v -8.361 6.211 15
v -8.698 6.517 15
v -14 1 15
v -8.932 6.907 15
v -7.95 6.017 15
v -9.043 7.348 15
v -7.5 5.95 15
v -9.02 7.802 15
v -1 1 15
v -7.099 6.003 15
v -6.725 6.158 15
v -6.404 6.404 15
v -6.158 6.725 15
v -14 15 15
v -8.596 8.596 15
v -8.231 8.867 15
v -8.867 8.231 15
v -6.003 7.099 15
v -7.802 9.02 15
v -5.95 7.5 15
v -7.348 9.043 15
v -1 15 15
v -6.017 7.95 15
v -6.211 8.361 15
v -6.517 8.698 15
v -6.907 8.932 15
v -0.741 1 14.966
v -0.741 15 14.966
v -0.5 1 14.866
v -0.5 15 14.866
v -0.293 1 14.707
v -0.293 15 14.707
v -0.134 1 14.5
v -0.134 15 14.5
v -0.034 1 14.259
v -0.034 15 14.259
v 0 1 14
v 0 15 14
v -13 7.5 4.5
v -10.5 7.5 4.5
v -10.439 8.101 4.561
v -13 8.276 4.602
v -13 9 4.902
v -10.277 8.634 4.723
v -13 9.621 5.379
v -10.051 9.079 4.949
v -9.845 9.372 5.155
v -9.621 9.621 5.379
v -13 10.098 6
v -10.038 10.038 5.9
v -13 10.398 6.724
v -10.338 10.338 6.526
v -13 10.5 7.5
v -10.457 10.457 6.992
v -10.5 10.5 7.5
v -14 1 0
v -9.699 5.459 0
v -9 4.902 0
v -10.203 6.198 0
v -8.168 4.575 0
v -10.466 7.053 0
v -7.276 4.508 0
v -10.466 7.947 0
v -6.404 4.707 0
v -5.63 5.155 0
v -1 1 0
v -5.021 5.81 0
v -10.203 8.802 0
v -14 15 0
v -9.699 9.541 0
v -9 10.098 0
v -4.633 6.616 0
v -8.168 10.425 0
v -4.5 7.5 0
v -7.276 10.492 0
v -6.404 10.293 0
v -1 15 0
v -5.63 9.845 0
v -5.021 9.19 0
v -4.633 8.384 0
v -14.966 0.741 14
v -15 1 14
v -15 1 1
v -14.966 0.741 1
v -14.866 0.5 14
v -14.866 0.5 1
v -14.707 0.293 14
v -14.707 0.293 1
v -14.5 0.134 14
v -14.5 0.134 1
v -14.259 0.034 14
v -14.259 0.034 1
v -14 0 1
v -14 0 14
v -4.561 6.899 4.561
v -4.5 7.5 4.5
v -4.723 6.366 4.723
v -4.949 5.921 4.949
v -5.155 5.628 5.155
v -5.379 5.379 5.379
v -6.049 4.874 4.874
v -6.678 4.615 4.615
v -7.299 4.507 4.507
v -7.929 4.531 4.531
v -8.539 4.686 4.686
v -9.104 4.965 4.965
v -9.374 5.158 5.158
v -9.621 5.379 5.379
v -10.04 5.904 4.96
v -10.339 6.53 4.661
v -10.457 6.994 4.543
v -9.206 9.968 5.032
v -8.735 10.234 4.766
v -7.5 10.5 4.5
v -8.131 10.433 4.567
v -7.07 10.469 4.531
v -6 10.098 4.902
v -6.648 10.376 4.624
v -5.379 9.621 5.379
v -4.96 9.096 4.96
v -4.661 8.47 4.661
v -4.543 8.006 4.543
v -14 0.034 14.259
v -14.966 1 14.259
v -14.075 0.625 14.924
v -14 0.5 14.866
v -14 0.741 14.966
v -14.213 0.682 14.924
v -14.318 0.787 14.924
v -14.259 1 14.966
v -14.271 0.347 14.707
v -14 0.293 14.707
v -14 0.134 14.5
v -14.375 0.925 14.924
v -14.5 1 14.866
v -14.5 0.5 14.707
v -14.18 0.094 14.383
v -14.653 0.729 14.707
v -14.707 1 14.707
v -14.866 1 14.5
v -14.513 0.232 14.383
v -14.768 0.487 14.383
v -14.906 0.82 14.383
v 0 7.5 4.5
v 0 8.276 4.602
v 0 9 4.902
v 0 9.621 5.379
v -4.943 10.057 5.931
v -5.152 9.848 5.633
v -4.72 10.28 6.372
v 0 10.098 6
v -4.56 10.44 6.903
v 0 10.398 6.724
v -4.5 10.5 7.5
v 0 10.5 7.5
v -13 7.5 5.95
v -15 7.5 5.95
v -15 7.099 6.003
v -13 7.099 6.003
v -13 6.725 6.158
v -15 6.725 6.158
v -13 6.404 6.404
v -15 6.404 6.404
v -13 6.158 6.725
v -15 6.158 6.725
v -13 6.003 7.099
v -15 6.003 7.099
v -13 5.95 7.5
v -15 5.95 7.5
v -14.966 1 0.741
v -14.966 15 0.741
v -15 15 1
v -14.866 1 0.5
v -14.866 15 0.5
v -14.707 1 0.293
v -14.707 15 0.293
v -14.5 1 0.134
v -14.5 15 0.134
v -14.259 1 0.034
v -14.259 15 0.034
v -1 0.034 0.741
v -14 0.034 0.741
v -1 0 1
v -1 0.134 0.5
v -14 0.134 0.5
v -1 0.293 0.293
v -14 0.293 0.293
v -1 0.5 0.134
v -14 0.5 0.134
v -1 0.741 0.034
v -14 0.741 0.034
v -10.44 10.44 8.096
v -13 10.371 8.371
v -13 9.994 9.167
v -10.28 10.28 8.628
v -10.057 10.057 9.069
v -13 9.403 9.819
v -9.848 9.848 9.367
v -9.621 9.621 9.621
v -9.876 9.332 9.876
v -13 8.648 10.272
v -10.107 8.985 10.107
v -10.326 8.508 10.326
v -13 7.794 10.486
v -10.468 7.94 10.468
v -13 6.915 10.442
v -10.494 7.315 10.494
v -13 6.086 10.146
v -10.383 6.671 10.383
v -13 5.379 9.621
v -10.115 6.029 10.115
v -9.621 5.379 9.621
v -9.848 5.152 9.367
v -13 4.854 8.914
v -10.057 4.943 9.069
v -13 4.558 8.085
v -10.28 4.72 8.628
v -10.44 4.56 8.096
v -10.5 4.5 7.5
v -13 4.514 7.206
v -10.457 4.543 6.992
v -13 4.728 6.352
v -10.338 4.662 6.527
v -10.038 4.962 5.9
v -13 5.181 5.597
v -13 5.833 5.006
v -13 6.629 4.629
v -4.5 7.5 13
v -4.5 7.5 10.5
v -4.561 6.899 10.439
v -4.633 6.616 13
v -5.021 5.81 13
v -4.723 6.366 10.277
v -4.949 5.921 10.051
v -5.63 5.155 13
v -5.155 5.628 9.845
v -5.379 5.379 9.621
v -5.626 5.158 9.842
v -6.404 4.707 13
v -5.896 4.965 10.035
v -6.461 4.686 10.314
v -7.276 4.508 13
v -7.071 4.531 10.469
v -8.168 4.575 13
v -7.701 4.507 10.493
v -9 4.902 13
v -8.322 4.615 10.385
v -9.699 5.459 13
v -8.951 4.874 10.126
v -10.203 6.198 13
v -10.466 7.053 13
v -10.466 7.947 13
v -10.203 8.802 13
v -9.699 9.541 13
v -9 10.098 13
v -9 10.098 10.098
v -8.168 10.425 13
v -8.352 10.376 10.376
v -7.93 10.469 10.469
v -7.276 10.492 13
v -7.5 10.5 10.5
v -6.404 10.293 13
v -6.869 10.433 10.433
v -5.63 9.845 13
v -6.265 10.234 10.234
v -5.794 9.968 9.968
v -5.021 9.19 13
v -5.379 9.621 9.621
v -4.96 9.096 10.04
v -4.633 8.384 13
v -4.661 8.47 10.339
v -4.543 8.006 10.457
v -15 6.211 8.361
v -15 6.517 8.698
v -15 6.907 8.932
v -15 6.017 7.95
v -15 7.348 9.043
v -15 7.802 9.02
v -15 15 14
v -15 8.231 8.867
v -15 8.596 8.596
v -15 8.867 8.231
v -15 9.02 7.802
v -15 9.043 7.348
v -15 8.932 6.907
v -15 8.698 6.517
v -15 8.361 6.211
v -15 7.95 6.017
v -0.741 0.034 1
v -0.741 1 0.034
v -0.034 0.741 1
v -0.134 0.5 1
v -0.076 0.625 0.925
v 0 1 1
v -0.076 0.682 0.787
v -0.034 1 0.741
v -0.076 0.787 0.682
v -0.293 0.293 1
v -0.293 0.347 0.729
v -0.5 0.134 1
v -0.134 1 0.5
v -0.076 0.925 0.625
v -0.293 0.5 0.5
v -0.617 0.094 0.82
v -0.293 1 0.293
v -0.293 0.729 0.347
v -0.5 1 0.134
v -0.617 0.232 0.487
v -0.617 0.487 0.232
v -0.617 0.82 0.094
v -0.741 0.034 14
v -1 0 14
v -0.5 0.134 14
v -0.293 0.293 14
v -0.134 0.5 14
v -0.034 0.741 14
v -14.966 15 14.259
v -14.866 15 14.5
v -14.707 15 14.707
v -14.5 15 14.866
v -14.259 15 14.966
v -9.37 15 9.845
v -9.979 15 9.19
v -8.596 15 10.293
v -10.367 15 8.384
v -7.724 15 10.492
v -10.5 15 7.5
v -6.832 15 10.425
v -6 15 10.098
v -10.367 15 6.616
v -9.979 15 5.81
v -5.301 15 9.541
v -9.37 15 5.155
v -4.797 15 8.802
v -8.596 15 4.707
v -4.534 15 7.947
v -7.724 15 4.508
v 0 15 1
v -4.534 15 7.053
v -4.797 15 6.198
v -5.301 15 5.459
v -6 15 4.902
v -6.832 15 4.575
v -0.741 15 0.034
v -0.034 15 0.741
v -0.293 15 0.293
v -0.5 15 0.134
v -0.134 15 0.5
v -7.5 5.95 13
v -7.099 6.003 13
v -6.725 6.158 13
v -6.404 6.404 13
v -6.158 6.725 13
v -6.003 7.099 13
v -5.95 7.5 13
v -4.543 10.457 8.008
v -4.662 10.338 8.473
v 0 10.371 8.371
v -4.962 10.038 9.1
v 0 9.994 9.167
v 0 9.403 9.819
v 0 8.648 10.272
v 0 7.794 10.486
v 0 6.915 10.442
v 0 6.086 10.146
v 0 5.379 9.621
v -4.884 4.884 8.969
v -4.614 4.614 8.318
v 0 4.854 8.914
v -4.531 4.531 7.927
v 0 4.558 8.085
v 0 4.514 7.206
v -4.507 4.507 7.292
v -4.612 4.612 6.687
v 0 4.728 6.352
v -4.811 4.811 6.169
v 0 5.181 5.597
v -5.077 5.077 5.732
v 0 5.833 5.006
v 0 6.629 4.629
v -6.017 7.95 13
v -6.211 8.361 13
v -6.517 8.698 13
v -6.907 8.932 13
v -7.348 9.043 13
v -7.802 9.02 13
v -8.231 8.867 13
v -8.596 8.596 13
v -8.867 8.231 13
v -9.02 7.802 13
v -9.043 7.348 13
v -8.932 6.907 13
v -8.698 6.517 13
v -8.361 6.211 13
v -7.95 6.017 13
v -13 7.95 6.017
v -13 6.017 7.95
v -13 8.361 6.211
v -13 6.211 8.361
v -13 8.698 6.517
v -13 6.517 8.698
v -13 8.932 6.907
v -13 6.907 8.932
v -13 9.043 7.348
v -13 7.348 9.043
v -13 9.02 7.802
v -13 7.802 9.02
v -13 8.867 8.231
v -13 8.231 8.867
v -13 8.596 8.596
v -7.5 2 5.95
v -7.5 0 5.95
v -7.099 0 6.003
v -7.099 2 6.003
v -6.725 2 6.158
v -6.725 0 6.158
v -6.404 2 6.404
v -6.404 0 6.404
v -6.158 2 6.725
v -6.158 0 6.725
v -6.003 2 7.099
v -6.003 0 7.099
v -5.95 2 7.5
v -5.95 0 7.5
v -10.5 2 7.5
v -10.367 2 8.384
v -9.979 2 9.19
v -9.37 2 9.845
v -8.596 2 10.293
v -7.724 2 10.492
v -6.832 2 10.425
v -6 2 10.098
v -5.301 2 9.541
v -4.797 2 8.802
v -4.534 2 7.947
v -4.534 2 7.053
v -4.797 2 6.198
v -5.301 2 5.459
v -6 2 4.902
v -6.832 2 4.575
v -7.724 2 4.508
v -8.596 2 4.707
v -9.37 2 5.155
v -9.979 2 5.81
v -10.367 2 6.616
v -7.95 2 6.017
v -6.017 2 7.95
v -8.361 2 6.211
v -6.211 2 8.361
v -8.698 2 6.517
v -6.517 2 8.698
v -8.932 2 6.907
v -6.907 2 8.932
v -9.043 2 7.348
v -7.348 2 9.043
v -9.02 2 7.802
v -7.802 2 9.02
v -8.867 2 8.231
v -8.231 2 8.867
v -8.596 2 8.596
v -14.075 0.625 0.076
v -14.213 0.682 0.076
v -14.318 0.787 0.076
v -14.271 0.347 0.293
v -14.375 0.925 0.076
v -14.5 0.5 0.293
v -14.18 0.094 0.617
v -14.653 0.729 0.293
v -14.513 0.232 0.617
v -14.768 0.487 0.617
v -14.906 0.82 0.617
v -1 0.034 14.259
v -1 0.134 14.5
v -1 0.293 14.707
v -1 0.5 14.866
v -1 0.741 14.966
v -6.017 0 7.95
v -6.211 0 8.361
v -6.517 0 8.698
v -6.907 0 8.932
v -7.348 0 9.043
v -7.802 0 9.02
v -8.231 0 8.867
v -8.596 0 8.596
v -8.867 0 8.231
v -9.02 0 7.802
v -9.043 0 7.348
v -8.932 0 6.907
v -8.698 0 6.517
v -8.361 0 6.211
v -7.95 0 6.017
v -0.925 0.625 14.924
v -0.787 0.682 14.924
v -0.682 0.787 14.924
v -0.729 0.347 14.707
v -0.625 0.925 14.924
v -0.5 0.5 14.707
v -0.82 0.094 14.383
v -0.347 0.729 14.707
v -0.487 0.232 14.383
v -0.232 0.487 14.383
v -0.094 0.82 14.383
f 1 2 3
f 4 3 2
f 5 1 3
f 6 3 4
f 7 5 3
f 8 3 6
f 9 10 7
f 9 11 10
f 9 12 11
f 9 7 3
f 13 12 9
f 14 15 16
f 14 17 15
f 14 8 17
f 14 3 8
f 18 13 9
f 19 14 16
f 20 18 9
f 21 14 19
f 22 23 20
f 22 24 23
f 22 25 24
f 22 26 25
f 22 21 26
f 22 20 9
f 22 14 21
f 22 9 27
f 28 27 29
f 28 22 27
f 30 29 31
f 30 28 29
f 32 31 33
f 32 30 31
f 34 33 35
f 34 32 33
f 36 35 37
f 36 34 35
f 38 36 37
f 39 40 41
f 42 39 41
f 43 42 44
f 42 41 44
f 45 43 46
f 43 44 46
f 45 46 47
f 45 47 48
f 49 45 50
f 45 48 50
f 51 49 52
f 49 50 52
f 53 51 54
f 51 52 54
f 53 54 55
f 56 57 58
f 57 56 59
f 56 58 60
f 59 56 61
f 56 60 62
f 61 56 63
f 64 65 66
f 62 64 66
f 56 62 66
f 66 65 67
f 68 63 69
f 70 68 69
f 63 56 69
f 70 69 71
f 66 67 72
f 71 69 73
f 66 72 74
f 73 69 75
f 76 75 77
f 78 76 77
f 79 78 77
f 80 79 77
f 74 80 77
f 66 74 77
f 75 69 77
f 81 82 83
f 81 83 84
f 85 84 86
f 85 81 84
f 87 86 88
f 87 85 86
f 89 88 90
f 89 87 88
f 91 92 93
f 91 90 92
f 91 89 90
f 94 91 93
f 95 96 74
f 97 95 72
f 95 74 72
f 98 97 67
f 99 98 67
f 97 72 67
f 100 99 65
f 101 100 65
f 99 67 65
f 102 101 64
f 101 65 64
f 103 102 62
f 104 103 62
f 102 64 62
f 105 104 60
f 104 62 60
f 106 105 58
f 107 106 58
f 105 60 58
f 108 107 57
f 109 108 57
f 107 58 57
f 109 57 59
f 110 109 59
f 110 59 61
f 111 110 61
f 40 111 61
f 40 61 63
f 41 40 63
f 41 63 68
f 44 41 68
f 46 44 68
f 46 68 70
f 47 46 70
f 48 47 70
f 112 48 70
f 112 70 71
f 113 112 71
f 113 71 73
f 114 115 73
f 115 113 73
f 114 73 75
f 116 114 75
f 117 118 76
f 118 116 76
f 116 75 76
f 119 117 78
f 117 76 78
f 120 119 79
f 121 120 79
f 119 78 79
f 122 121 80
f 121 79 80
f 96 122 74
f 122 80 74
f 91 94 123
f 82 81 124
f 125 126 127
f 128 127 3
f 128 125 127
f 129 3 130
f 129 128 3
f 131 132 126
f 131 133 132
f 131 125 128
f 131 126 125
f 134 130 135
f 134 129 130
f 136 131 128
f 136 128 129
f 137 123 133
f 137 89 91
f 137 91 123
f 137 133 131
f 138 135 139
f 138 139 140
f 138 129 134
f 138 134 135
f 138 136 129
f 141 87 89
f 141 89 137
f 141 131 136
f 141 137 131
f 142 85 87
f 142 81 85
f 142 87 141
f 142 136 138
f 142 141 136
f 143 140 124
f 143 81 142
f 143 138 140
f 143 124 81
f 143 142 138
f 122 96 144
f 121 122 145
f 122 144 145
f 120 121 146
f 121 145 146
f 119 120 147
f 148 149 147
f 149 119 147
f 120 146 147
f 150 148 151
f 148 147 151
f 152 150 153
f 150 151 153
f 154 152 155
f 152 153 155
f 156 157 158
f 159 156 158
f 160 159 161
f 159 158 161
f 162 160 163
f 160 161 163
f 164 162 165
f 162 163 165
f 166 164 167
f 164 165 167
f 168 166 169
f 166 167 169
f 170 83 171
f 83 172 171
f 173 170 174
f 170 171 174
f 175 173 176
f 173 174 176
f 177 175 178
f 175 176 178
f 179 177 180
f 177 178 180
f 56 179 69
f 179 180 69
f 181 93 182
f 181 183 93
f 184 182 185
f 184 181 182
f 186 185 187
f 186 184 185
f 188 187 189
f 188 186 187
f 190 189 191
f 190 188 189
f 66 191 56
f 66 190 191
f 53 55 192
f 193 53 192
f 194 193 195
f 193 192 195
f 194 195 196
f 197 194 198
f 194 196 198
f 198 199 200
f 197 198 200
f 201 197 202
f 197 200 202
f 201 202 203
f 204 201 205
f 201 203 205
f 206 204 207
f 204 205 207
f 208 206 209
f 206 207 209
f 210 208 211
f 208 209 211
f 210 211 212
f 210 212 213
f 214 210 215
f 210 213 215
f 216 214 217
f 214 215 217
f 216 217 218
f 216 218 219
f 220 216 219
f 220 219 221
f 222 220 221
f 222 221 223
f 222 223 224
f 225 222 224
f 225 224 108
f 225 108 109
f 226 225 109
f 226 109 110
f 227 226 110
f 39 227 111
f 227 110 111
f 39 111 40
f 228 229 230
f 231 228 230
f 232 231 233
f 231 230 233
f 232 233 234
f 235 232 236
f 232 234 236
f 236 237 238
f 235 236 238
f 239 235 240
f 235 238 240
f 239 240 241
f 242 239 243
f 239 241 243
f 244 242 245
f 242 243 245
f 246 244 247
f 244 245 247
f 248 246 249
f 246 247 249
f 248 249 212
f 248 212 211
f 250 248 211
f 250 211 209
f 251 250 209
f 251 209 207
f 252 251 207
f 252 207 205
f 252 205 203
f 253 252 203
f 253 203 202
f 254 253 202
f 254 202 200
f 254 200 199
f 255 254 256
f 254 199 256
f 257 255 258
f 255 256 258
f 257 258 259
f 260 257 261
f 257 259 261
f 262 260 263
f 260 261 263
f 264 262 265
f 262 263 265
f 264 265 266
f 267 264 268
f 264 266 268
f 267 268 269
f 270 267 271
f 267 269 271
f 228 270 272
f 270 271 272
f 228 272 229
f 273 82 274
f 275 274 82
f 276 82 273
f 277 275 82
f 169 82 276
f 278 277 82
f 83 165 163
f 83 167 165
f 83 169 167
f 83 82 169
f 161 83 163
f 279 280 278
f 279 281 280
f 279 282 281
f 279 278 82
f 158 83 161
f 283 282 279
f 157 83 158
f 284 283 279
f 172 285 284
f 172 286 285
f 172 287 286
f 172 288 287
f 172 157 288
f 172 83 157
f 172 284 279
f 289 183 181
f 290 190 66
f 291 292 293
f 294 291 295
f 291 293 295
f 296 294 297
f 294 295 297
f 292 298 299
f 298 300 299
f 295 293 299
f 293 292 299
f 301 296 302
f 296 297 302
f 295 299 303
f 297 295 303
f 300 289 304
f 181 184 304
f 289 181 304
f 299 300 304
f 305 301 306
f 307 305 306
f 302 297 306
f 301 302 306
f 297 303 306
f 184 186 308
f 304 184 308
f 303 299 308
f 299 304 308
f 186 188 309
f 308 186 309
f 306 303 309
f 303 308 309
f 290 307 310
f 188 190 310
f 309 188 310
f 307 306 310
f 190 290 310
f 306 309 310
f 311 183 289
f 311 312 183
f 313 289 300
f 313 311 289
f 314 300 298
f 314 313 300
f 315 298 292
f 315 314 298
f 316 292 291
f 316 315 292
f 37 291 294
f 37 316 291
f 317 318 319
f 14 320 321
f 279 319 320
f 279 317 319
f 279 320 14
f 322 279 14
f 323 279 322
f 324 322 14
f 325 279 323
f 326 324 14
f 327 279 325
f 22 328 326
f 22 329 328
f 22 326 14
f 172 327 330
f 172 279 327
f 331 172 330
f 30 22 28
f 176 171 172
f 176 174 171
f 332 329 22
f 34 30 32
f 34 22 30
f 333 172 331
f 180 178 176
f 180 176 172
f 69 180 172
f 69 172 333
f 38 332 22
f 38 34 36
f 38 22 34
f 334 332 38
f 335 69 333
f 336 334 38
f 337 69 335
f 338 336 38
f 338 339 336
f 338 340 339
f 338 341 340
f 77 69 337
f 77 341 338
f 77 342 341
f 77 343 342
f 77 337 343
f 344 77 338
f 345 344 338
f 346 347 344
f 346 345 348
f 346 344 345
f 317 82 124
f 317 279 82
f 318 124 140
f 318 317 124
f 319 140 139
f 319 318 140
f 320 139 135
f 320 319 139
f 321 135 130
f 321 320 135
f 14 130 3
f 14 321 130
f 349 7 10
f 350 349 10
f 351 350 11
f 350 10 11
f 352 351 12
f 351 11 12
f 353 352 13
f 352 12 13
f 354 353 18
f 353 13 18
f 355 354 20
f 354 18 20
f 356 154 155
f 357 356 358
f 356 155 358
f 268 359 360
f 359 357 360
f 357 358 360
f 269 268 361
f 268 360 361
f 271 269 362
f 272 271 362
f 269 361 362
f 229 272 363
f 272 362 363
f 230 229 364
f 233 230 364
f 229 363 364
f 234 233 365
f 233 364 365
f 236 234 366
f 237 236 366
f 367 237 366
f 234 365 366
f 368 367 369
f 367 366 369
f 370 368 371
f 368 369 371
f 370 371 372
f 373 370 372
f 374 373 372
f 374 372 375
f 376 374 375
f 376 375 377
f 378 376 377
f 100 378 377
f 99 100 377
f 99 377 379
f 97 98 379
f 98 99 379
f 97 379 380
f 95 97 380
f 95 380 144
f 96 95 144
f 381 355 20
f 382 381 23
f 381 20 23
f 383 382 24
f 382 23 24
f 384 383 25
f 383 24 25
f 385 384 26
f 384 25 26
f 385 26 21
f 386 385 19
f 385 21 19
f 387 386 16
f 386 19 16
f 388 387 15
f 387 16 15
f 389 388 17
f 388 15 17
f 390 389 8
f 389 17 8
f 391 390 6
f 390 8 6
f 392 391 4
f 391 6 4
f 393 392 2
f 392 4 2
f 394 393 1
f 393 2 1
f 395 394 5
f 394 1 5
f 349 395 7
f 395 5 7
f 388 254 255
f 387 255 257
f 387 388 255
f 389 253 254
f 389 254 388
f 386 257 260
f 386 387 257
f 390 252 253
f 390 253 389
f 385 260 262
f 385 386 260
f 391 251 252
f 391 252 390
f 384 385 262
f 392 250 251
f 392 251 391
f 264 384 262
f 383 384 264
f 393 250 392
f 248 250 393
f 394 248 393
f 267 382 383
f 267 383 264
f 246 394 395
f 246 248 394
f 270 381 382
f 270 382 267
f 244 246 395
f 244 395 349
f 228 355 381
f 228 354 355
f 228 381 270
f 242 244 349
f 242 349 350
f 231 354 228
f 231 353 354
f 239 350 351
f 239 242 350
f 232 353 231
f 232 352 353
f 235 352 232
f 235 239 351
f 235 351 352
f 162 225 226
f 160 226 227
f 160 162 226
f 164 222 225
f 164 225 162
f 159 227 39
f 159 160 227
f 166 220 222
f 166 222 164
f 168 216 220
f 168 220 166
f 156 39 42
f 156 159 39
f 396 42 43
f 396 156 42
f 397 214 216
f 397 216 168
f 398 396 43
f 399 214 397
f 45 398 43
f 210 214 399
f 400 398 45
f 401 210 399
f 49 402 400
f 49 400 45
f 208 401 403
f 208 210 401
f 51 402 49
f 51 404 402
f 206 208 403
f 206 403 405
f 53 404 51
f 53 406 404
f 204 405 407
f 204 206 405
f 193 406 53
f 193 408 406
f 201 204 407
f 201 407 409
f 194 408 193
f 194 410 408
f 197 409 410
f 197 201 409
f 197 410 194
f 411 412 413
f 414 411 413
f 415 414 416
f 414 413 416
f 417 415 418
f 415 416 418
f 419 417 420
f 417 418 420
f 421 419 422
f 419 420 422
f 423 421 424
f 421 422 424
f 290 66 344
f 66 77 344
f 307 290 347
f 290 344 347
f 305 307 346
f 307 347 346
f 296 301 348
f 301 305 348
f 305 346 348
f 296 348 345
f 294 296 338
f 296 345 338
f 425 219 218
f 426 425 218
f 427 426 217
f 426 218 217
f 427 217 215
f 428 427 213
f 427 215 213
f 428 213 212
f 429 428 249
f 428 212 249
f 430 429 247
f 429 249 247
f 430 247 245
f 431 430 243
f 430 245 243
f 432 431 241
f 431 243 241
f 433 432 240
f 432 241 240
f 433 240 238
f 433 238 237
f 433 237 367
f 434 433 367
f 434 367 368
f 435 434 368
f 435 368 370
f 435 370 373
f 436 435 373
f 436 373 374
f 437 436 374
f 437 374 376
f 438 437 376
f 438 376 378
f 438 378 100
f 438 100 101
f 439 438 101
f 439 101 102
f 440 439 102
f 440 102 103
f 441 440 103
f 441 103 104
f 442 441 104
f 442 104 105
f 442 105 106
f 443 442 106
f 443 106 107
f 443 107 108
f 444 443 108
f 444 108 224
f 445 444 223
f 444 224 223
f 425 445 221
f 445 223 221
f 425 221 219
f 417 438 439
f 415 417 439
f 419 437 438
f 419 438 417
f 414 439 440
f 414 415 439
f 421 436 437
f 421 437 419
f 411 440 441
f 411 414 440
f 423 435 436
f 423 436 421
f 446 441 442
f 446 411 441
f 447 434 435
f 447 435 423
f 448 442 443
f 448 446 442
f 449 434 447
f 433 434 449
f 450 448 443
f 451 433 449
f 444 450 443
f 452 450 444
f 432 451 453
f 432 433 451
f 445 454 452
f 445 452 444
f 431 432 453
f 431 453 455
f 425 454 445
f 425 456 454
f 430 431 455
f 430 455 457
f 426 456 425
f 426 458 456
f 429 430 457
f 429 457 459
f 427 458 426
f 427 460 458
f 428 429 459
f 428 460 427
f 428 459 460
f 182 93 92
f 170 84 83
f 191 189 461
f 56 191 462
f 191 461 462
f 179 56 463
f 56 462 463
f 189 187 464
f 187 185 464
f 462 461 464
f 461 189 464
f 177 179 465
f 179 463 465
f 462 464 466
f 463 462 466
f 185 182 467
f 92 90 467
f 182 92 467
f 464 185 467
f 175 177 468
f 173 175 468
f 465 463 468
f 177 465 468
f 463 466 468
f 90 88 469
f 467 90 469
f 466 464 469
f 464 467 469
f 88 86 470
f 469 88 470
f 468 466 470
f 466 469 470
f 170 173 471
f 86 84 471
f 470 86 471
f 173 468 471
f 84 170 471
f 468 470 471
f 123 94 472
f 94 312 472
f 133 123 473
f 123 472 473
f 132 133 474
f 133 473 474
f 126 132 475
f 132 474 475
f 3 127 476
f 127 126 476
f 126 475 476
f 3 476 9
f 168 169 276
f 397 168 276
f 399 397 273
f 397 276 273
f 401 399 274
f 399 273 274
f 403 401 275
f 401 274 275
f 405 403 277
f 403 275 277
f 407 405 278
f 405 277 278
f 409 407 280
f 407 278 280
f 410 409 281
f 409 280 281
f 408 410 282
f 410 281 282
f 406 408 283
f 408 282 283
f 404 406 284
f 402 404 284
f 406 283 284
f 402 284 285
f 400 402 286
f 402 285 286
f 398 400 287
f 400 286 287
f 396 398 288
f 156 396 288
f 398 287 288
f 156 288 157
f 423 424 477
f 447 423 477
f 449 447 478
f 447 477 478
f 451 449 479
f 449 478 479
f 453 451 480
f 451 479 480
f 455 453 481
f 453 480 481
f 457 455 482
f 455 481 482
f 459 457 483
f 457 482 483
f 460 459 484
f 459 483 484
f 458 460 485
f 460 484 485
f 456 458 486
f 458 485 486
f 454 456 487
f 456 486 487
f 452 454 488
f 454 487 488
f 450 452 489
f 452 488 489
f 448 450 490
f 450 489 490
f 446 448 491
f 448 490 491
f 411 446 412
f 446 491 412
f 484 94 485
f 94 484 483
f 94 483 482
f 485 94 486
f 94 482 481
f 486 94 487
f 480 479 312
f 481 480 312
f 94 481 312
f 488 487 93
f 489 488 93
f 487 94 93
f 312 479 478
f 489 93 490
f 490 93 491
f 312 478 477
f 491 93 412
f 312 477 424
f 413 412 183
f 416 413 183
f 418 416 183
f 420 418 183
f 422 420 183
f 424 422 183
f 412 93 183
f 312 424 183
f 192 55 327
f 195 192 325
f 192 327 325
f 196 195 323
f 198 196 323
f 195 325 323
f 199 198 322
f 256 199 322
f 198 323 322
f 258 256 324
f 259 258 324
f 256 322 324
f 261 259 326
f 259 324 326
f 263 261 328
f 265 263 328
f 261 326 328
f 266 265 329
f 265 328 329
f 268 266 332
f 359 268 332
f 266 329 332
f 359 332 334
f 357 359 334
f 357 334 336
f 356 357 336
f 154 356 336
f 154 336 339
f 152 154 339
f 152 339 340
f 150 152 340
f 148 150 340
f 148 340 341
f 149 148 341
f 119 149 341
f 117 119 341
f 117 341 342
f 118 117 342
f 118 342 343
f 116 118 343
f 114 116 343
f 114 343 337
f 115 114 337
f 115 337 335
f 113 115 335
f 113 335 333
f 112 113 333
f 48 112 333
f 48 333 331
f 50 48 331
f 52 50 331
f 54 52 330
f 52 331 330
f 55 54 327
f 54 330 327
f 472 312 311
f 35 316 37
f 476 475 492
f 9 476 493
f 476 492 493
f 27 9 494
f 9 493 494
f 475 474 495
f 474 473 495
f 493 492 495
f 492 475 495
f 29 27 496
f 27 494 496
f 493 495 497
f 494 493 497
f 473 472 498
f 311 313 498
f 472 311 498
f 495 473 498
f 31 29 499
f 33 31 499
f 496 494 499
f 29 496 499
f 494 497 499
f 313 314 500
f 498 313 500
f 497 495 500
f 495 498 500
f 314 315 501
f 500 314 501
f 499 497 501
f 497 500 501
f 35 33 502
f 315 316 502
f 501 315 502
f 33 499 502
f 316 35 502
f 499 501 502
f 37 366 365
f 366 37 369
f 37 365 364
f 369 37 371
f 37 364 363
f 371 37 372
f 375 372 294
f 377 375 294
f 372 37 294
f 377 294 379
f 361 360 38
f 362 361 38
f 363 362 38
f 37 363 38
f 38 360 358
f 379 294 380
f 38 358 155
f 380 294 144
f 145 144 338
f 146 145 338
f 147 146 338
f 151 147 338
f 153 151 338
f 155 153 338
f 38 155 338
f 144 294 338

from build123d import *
from build123d import SkipClean  # not in build123d's __all__

# Parameters (mm, degrees)
F0_W      = 15
F0_H      = 15
F1_DEPTH  = 15
F3_DEPTH  = 25
F5_DEPTH  = 25
F7_DEPTH  = 13
F9_DEPTH  = 25
F10_R     = 3
F11_DEPTH = 13
F12_R     = 3
F13_DEPTH = 13
F14_R     = 1


with BuildPart() as f1:
    # F0 (on Top) → F1 (new body)
    with BuildSketch(Plane.XY):
        with Locations((-7.5, 7.5)):
            Rectangle(F0_W, F0_H)
    extrude(amount=F1_DEPTH)

    # F2 (on face) → F3 (cut)
    with BuildSketch(Plane.XZ):
        with BuildLine():
            ThreePointArc((-7.5, 5.95), (-6.4039844892, 6.4039844892), (-5.95, 7.5))
            ThreePointArc((-5.95, 7.5), (-8.5960155108, 8.5960155108), (-7.5, 5.95))
        make_face()
    extrude(amount=-F3_DEPTH, mode=Mode.SUBTRACT)

    # F4 (on face) → F5 (cut)
    with BuildSketch(Plane.XY.offset(15)):
        with BuildLine():
            ThreePointArc((-7.5, 5.95), (-6.4039844892, 6.4039844892), (-5.95, 7.5))
            ThreePointArc((-5.95, 7.5), (-8.5960155108, 8.5960155108), (-7.5, 5.95))
        make_face()
    extrude(amount=-F5_DEPTH, mode=Mode.SUBTRACT)

    # F6 (on face) → F7 (cut)
    with BuildSketch(Plane.YZ):
        with BuildLine():
            ThreePointArc((7.5, 4.5), (9.6213203436, 5.3786796564), (10.5, 7.5))
            ThreePointArc((10.5, 7.5), (5.3786796564, 9.6213203436), (7.5, 4.5))
        make_face()
    with SkipClean():  # cleaning this boolean's faces spoils the solid; the shape is the same uncleaned
        extrude(amount=-F7_DEPTH, mode=Mode.SUBTRACT)

    # F8 (on face) → F9 (cut)
    with BuildSketch(Plane(origin=(-15, 0, 0), x_dir=(0, -1, 0), z_dir=(-1, 0, 0))):
        with BuildLine():
            ThreePointArc((-7.5, 5.95), (-6.4039844892, 6.4039844892), (-5.95, 7.5))
            ThreePointArc((-5.95, 7.5), (-8.5960155108, 8.5960155108), (-7.5, 5.95))
        make_face()
    with SkipClean():  # cleaning this boolean's faces spoils the solid; the shape is the same uncleaned
        extrude(amount=-F9_DEPTH, mode=Mode.SUBTRACT)

    # F10 (on face) → F11 (cut)
    with BuildSketch(Plane(origin=(0, 15, 0), x_dir=(-1, 0, 0), z_dir=(0, 1, 0))):
        with Locations((7.5, 7.5)):
            Circle(F10_R)
    extrude(amount=-F11_DEPTH, mode=Mode.SUBTRACT)

    # F12 (on face) → F13 (cut)
    with BuildSketch(Plane(origin=(0, 0, 0), x_dir=(1, 0, 0), z_dir=(0, 0, -1))):
        with Locations((-7.5, -7.5)):
            Circle(F12_R)
    extrude(amount=-F13_DEPTH, mode=Mode.SUBTRACT)

    # F14
    f14_edges = [f1.edges().sort_by_distance(p)[0] for p in [
        (-15, 0, 7.5),
        (-7.5, 0, 0),
        (0, 0, 7.5),
        (-7.5, 0, 15),
        (-15, 7.5, 0),
        (-15, 7.5, 15),
        (0, 7.5, 15),
        (0, 7.5, 0),
    ]]
    fillet(f14_edges, radius=F14_R)


solid = f1.part
